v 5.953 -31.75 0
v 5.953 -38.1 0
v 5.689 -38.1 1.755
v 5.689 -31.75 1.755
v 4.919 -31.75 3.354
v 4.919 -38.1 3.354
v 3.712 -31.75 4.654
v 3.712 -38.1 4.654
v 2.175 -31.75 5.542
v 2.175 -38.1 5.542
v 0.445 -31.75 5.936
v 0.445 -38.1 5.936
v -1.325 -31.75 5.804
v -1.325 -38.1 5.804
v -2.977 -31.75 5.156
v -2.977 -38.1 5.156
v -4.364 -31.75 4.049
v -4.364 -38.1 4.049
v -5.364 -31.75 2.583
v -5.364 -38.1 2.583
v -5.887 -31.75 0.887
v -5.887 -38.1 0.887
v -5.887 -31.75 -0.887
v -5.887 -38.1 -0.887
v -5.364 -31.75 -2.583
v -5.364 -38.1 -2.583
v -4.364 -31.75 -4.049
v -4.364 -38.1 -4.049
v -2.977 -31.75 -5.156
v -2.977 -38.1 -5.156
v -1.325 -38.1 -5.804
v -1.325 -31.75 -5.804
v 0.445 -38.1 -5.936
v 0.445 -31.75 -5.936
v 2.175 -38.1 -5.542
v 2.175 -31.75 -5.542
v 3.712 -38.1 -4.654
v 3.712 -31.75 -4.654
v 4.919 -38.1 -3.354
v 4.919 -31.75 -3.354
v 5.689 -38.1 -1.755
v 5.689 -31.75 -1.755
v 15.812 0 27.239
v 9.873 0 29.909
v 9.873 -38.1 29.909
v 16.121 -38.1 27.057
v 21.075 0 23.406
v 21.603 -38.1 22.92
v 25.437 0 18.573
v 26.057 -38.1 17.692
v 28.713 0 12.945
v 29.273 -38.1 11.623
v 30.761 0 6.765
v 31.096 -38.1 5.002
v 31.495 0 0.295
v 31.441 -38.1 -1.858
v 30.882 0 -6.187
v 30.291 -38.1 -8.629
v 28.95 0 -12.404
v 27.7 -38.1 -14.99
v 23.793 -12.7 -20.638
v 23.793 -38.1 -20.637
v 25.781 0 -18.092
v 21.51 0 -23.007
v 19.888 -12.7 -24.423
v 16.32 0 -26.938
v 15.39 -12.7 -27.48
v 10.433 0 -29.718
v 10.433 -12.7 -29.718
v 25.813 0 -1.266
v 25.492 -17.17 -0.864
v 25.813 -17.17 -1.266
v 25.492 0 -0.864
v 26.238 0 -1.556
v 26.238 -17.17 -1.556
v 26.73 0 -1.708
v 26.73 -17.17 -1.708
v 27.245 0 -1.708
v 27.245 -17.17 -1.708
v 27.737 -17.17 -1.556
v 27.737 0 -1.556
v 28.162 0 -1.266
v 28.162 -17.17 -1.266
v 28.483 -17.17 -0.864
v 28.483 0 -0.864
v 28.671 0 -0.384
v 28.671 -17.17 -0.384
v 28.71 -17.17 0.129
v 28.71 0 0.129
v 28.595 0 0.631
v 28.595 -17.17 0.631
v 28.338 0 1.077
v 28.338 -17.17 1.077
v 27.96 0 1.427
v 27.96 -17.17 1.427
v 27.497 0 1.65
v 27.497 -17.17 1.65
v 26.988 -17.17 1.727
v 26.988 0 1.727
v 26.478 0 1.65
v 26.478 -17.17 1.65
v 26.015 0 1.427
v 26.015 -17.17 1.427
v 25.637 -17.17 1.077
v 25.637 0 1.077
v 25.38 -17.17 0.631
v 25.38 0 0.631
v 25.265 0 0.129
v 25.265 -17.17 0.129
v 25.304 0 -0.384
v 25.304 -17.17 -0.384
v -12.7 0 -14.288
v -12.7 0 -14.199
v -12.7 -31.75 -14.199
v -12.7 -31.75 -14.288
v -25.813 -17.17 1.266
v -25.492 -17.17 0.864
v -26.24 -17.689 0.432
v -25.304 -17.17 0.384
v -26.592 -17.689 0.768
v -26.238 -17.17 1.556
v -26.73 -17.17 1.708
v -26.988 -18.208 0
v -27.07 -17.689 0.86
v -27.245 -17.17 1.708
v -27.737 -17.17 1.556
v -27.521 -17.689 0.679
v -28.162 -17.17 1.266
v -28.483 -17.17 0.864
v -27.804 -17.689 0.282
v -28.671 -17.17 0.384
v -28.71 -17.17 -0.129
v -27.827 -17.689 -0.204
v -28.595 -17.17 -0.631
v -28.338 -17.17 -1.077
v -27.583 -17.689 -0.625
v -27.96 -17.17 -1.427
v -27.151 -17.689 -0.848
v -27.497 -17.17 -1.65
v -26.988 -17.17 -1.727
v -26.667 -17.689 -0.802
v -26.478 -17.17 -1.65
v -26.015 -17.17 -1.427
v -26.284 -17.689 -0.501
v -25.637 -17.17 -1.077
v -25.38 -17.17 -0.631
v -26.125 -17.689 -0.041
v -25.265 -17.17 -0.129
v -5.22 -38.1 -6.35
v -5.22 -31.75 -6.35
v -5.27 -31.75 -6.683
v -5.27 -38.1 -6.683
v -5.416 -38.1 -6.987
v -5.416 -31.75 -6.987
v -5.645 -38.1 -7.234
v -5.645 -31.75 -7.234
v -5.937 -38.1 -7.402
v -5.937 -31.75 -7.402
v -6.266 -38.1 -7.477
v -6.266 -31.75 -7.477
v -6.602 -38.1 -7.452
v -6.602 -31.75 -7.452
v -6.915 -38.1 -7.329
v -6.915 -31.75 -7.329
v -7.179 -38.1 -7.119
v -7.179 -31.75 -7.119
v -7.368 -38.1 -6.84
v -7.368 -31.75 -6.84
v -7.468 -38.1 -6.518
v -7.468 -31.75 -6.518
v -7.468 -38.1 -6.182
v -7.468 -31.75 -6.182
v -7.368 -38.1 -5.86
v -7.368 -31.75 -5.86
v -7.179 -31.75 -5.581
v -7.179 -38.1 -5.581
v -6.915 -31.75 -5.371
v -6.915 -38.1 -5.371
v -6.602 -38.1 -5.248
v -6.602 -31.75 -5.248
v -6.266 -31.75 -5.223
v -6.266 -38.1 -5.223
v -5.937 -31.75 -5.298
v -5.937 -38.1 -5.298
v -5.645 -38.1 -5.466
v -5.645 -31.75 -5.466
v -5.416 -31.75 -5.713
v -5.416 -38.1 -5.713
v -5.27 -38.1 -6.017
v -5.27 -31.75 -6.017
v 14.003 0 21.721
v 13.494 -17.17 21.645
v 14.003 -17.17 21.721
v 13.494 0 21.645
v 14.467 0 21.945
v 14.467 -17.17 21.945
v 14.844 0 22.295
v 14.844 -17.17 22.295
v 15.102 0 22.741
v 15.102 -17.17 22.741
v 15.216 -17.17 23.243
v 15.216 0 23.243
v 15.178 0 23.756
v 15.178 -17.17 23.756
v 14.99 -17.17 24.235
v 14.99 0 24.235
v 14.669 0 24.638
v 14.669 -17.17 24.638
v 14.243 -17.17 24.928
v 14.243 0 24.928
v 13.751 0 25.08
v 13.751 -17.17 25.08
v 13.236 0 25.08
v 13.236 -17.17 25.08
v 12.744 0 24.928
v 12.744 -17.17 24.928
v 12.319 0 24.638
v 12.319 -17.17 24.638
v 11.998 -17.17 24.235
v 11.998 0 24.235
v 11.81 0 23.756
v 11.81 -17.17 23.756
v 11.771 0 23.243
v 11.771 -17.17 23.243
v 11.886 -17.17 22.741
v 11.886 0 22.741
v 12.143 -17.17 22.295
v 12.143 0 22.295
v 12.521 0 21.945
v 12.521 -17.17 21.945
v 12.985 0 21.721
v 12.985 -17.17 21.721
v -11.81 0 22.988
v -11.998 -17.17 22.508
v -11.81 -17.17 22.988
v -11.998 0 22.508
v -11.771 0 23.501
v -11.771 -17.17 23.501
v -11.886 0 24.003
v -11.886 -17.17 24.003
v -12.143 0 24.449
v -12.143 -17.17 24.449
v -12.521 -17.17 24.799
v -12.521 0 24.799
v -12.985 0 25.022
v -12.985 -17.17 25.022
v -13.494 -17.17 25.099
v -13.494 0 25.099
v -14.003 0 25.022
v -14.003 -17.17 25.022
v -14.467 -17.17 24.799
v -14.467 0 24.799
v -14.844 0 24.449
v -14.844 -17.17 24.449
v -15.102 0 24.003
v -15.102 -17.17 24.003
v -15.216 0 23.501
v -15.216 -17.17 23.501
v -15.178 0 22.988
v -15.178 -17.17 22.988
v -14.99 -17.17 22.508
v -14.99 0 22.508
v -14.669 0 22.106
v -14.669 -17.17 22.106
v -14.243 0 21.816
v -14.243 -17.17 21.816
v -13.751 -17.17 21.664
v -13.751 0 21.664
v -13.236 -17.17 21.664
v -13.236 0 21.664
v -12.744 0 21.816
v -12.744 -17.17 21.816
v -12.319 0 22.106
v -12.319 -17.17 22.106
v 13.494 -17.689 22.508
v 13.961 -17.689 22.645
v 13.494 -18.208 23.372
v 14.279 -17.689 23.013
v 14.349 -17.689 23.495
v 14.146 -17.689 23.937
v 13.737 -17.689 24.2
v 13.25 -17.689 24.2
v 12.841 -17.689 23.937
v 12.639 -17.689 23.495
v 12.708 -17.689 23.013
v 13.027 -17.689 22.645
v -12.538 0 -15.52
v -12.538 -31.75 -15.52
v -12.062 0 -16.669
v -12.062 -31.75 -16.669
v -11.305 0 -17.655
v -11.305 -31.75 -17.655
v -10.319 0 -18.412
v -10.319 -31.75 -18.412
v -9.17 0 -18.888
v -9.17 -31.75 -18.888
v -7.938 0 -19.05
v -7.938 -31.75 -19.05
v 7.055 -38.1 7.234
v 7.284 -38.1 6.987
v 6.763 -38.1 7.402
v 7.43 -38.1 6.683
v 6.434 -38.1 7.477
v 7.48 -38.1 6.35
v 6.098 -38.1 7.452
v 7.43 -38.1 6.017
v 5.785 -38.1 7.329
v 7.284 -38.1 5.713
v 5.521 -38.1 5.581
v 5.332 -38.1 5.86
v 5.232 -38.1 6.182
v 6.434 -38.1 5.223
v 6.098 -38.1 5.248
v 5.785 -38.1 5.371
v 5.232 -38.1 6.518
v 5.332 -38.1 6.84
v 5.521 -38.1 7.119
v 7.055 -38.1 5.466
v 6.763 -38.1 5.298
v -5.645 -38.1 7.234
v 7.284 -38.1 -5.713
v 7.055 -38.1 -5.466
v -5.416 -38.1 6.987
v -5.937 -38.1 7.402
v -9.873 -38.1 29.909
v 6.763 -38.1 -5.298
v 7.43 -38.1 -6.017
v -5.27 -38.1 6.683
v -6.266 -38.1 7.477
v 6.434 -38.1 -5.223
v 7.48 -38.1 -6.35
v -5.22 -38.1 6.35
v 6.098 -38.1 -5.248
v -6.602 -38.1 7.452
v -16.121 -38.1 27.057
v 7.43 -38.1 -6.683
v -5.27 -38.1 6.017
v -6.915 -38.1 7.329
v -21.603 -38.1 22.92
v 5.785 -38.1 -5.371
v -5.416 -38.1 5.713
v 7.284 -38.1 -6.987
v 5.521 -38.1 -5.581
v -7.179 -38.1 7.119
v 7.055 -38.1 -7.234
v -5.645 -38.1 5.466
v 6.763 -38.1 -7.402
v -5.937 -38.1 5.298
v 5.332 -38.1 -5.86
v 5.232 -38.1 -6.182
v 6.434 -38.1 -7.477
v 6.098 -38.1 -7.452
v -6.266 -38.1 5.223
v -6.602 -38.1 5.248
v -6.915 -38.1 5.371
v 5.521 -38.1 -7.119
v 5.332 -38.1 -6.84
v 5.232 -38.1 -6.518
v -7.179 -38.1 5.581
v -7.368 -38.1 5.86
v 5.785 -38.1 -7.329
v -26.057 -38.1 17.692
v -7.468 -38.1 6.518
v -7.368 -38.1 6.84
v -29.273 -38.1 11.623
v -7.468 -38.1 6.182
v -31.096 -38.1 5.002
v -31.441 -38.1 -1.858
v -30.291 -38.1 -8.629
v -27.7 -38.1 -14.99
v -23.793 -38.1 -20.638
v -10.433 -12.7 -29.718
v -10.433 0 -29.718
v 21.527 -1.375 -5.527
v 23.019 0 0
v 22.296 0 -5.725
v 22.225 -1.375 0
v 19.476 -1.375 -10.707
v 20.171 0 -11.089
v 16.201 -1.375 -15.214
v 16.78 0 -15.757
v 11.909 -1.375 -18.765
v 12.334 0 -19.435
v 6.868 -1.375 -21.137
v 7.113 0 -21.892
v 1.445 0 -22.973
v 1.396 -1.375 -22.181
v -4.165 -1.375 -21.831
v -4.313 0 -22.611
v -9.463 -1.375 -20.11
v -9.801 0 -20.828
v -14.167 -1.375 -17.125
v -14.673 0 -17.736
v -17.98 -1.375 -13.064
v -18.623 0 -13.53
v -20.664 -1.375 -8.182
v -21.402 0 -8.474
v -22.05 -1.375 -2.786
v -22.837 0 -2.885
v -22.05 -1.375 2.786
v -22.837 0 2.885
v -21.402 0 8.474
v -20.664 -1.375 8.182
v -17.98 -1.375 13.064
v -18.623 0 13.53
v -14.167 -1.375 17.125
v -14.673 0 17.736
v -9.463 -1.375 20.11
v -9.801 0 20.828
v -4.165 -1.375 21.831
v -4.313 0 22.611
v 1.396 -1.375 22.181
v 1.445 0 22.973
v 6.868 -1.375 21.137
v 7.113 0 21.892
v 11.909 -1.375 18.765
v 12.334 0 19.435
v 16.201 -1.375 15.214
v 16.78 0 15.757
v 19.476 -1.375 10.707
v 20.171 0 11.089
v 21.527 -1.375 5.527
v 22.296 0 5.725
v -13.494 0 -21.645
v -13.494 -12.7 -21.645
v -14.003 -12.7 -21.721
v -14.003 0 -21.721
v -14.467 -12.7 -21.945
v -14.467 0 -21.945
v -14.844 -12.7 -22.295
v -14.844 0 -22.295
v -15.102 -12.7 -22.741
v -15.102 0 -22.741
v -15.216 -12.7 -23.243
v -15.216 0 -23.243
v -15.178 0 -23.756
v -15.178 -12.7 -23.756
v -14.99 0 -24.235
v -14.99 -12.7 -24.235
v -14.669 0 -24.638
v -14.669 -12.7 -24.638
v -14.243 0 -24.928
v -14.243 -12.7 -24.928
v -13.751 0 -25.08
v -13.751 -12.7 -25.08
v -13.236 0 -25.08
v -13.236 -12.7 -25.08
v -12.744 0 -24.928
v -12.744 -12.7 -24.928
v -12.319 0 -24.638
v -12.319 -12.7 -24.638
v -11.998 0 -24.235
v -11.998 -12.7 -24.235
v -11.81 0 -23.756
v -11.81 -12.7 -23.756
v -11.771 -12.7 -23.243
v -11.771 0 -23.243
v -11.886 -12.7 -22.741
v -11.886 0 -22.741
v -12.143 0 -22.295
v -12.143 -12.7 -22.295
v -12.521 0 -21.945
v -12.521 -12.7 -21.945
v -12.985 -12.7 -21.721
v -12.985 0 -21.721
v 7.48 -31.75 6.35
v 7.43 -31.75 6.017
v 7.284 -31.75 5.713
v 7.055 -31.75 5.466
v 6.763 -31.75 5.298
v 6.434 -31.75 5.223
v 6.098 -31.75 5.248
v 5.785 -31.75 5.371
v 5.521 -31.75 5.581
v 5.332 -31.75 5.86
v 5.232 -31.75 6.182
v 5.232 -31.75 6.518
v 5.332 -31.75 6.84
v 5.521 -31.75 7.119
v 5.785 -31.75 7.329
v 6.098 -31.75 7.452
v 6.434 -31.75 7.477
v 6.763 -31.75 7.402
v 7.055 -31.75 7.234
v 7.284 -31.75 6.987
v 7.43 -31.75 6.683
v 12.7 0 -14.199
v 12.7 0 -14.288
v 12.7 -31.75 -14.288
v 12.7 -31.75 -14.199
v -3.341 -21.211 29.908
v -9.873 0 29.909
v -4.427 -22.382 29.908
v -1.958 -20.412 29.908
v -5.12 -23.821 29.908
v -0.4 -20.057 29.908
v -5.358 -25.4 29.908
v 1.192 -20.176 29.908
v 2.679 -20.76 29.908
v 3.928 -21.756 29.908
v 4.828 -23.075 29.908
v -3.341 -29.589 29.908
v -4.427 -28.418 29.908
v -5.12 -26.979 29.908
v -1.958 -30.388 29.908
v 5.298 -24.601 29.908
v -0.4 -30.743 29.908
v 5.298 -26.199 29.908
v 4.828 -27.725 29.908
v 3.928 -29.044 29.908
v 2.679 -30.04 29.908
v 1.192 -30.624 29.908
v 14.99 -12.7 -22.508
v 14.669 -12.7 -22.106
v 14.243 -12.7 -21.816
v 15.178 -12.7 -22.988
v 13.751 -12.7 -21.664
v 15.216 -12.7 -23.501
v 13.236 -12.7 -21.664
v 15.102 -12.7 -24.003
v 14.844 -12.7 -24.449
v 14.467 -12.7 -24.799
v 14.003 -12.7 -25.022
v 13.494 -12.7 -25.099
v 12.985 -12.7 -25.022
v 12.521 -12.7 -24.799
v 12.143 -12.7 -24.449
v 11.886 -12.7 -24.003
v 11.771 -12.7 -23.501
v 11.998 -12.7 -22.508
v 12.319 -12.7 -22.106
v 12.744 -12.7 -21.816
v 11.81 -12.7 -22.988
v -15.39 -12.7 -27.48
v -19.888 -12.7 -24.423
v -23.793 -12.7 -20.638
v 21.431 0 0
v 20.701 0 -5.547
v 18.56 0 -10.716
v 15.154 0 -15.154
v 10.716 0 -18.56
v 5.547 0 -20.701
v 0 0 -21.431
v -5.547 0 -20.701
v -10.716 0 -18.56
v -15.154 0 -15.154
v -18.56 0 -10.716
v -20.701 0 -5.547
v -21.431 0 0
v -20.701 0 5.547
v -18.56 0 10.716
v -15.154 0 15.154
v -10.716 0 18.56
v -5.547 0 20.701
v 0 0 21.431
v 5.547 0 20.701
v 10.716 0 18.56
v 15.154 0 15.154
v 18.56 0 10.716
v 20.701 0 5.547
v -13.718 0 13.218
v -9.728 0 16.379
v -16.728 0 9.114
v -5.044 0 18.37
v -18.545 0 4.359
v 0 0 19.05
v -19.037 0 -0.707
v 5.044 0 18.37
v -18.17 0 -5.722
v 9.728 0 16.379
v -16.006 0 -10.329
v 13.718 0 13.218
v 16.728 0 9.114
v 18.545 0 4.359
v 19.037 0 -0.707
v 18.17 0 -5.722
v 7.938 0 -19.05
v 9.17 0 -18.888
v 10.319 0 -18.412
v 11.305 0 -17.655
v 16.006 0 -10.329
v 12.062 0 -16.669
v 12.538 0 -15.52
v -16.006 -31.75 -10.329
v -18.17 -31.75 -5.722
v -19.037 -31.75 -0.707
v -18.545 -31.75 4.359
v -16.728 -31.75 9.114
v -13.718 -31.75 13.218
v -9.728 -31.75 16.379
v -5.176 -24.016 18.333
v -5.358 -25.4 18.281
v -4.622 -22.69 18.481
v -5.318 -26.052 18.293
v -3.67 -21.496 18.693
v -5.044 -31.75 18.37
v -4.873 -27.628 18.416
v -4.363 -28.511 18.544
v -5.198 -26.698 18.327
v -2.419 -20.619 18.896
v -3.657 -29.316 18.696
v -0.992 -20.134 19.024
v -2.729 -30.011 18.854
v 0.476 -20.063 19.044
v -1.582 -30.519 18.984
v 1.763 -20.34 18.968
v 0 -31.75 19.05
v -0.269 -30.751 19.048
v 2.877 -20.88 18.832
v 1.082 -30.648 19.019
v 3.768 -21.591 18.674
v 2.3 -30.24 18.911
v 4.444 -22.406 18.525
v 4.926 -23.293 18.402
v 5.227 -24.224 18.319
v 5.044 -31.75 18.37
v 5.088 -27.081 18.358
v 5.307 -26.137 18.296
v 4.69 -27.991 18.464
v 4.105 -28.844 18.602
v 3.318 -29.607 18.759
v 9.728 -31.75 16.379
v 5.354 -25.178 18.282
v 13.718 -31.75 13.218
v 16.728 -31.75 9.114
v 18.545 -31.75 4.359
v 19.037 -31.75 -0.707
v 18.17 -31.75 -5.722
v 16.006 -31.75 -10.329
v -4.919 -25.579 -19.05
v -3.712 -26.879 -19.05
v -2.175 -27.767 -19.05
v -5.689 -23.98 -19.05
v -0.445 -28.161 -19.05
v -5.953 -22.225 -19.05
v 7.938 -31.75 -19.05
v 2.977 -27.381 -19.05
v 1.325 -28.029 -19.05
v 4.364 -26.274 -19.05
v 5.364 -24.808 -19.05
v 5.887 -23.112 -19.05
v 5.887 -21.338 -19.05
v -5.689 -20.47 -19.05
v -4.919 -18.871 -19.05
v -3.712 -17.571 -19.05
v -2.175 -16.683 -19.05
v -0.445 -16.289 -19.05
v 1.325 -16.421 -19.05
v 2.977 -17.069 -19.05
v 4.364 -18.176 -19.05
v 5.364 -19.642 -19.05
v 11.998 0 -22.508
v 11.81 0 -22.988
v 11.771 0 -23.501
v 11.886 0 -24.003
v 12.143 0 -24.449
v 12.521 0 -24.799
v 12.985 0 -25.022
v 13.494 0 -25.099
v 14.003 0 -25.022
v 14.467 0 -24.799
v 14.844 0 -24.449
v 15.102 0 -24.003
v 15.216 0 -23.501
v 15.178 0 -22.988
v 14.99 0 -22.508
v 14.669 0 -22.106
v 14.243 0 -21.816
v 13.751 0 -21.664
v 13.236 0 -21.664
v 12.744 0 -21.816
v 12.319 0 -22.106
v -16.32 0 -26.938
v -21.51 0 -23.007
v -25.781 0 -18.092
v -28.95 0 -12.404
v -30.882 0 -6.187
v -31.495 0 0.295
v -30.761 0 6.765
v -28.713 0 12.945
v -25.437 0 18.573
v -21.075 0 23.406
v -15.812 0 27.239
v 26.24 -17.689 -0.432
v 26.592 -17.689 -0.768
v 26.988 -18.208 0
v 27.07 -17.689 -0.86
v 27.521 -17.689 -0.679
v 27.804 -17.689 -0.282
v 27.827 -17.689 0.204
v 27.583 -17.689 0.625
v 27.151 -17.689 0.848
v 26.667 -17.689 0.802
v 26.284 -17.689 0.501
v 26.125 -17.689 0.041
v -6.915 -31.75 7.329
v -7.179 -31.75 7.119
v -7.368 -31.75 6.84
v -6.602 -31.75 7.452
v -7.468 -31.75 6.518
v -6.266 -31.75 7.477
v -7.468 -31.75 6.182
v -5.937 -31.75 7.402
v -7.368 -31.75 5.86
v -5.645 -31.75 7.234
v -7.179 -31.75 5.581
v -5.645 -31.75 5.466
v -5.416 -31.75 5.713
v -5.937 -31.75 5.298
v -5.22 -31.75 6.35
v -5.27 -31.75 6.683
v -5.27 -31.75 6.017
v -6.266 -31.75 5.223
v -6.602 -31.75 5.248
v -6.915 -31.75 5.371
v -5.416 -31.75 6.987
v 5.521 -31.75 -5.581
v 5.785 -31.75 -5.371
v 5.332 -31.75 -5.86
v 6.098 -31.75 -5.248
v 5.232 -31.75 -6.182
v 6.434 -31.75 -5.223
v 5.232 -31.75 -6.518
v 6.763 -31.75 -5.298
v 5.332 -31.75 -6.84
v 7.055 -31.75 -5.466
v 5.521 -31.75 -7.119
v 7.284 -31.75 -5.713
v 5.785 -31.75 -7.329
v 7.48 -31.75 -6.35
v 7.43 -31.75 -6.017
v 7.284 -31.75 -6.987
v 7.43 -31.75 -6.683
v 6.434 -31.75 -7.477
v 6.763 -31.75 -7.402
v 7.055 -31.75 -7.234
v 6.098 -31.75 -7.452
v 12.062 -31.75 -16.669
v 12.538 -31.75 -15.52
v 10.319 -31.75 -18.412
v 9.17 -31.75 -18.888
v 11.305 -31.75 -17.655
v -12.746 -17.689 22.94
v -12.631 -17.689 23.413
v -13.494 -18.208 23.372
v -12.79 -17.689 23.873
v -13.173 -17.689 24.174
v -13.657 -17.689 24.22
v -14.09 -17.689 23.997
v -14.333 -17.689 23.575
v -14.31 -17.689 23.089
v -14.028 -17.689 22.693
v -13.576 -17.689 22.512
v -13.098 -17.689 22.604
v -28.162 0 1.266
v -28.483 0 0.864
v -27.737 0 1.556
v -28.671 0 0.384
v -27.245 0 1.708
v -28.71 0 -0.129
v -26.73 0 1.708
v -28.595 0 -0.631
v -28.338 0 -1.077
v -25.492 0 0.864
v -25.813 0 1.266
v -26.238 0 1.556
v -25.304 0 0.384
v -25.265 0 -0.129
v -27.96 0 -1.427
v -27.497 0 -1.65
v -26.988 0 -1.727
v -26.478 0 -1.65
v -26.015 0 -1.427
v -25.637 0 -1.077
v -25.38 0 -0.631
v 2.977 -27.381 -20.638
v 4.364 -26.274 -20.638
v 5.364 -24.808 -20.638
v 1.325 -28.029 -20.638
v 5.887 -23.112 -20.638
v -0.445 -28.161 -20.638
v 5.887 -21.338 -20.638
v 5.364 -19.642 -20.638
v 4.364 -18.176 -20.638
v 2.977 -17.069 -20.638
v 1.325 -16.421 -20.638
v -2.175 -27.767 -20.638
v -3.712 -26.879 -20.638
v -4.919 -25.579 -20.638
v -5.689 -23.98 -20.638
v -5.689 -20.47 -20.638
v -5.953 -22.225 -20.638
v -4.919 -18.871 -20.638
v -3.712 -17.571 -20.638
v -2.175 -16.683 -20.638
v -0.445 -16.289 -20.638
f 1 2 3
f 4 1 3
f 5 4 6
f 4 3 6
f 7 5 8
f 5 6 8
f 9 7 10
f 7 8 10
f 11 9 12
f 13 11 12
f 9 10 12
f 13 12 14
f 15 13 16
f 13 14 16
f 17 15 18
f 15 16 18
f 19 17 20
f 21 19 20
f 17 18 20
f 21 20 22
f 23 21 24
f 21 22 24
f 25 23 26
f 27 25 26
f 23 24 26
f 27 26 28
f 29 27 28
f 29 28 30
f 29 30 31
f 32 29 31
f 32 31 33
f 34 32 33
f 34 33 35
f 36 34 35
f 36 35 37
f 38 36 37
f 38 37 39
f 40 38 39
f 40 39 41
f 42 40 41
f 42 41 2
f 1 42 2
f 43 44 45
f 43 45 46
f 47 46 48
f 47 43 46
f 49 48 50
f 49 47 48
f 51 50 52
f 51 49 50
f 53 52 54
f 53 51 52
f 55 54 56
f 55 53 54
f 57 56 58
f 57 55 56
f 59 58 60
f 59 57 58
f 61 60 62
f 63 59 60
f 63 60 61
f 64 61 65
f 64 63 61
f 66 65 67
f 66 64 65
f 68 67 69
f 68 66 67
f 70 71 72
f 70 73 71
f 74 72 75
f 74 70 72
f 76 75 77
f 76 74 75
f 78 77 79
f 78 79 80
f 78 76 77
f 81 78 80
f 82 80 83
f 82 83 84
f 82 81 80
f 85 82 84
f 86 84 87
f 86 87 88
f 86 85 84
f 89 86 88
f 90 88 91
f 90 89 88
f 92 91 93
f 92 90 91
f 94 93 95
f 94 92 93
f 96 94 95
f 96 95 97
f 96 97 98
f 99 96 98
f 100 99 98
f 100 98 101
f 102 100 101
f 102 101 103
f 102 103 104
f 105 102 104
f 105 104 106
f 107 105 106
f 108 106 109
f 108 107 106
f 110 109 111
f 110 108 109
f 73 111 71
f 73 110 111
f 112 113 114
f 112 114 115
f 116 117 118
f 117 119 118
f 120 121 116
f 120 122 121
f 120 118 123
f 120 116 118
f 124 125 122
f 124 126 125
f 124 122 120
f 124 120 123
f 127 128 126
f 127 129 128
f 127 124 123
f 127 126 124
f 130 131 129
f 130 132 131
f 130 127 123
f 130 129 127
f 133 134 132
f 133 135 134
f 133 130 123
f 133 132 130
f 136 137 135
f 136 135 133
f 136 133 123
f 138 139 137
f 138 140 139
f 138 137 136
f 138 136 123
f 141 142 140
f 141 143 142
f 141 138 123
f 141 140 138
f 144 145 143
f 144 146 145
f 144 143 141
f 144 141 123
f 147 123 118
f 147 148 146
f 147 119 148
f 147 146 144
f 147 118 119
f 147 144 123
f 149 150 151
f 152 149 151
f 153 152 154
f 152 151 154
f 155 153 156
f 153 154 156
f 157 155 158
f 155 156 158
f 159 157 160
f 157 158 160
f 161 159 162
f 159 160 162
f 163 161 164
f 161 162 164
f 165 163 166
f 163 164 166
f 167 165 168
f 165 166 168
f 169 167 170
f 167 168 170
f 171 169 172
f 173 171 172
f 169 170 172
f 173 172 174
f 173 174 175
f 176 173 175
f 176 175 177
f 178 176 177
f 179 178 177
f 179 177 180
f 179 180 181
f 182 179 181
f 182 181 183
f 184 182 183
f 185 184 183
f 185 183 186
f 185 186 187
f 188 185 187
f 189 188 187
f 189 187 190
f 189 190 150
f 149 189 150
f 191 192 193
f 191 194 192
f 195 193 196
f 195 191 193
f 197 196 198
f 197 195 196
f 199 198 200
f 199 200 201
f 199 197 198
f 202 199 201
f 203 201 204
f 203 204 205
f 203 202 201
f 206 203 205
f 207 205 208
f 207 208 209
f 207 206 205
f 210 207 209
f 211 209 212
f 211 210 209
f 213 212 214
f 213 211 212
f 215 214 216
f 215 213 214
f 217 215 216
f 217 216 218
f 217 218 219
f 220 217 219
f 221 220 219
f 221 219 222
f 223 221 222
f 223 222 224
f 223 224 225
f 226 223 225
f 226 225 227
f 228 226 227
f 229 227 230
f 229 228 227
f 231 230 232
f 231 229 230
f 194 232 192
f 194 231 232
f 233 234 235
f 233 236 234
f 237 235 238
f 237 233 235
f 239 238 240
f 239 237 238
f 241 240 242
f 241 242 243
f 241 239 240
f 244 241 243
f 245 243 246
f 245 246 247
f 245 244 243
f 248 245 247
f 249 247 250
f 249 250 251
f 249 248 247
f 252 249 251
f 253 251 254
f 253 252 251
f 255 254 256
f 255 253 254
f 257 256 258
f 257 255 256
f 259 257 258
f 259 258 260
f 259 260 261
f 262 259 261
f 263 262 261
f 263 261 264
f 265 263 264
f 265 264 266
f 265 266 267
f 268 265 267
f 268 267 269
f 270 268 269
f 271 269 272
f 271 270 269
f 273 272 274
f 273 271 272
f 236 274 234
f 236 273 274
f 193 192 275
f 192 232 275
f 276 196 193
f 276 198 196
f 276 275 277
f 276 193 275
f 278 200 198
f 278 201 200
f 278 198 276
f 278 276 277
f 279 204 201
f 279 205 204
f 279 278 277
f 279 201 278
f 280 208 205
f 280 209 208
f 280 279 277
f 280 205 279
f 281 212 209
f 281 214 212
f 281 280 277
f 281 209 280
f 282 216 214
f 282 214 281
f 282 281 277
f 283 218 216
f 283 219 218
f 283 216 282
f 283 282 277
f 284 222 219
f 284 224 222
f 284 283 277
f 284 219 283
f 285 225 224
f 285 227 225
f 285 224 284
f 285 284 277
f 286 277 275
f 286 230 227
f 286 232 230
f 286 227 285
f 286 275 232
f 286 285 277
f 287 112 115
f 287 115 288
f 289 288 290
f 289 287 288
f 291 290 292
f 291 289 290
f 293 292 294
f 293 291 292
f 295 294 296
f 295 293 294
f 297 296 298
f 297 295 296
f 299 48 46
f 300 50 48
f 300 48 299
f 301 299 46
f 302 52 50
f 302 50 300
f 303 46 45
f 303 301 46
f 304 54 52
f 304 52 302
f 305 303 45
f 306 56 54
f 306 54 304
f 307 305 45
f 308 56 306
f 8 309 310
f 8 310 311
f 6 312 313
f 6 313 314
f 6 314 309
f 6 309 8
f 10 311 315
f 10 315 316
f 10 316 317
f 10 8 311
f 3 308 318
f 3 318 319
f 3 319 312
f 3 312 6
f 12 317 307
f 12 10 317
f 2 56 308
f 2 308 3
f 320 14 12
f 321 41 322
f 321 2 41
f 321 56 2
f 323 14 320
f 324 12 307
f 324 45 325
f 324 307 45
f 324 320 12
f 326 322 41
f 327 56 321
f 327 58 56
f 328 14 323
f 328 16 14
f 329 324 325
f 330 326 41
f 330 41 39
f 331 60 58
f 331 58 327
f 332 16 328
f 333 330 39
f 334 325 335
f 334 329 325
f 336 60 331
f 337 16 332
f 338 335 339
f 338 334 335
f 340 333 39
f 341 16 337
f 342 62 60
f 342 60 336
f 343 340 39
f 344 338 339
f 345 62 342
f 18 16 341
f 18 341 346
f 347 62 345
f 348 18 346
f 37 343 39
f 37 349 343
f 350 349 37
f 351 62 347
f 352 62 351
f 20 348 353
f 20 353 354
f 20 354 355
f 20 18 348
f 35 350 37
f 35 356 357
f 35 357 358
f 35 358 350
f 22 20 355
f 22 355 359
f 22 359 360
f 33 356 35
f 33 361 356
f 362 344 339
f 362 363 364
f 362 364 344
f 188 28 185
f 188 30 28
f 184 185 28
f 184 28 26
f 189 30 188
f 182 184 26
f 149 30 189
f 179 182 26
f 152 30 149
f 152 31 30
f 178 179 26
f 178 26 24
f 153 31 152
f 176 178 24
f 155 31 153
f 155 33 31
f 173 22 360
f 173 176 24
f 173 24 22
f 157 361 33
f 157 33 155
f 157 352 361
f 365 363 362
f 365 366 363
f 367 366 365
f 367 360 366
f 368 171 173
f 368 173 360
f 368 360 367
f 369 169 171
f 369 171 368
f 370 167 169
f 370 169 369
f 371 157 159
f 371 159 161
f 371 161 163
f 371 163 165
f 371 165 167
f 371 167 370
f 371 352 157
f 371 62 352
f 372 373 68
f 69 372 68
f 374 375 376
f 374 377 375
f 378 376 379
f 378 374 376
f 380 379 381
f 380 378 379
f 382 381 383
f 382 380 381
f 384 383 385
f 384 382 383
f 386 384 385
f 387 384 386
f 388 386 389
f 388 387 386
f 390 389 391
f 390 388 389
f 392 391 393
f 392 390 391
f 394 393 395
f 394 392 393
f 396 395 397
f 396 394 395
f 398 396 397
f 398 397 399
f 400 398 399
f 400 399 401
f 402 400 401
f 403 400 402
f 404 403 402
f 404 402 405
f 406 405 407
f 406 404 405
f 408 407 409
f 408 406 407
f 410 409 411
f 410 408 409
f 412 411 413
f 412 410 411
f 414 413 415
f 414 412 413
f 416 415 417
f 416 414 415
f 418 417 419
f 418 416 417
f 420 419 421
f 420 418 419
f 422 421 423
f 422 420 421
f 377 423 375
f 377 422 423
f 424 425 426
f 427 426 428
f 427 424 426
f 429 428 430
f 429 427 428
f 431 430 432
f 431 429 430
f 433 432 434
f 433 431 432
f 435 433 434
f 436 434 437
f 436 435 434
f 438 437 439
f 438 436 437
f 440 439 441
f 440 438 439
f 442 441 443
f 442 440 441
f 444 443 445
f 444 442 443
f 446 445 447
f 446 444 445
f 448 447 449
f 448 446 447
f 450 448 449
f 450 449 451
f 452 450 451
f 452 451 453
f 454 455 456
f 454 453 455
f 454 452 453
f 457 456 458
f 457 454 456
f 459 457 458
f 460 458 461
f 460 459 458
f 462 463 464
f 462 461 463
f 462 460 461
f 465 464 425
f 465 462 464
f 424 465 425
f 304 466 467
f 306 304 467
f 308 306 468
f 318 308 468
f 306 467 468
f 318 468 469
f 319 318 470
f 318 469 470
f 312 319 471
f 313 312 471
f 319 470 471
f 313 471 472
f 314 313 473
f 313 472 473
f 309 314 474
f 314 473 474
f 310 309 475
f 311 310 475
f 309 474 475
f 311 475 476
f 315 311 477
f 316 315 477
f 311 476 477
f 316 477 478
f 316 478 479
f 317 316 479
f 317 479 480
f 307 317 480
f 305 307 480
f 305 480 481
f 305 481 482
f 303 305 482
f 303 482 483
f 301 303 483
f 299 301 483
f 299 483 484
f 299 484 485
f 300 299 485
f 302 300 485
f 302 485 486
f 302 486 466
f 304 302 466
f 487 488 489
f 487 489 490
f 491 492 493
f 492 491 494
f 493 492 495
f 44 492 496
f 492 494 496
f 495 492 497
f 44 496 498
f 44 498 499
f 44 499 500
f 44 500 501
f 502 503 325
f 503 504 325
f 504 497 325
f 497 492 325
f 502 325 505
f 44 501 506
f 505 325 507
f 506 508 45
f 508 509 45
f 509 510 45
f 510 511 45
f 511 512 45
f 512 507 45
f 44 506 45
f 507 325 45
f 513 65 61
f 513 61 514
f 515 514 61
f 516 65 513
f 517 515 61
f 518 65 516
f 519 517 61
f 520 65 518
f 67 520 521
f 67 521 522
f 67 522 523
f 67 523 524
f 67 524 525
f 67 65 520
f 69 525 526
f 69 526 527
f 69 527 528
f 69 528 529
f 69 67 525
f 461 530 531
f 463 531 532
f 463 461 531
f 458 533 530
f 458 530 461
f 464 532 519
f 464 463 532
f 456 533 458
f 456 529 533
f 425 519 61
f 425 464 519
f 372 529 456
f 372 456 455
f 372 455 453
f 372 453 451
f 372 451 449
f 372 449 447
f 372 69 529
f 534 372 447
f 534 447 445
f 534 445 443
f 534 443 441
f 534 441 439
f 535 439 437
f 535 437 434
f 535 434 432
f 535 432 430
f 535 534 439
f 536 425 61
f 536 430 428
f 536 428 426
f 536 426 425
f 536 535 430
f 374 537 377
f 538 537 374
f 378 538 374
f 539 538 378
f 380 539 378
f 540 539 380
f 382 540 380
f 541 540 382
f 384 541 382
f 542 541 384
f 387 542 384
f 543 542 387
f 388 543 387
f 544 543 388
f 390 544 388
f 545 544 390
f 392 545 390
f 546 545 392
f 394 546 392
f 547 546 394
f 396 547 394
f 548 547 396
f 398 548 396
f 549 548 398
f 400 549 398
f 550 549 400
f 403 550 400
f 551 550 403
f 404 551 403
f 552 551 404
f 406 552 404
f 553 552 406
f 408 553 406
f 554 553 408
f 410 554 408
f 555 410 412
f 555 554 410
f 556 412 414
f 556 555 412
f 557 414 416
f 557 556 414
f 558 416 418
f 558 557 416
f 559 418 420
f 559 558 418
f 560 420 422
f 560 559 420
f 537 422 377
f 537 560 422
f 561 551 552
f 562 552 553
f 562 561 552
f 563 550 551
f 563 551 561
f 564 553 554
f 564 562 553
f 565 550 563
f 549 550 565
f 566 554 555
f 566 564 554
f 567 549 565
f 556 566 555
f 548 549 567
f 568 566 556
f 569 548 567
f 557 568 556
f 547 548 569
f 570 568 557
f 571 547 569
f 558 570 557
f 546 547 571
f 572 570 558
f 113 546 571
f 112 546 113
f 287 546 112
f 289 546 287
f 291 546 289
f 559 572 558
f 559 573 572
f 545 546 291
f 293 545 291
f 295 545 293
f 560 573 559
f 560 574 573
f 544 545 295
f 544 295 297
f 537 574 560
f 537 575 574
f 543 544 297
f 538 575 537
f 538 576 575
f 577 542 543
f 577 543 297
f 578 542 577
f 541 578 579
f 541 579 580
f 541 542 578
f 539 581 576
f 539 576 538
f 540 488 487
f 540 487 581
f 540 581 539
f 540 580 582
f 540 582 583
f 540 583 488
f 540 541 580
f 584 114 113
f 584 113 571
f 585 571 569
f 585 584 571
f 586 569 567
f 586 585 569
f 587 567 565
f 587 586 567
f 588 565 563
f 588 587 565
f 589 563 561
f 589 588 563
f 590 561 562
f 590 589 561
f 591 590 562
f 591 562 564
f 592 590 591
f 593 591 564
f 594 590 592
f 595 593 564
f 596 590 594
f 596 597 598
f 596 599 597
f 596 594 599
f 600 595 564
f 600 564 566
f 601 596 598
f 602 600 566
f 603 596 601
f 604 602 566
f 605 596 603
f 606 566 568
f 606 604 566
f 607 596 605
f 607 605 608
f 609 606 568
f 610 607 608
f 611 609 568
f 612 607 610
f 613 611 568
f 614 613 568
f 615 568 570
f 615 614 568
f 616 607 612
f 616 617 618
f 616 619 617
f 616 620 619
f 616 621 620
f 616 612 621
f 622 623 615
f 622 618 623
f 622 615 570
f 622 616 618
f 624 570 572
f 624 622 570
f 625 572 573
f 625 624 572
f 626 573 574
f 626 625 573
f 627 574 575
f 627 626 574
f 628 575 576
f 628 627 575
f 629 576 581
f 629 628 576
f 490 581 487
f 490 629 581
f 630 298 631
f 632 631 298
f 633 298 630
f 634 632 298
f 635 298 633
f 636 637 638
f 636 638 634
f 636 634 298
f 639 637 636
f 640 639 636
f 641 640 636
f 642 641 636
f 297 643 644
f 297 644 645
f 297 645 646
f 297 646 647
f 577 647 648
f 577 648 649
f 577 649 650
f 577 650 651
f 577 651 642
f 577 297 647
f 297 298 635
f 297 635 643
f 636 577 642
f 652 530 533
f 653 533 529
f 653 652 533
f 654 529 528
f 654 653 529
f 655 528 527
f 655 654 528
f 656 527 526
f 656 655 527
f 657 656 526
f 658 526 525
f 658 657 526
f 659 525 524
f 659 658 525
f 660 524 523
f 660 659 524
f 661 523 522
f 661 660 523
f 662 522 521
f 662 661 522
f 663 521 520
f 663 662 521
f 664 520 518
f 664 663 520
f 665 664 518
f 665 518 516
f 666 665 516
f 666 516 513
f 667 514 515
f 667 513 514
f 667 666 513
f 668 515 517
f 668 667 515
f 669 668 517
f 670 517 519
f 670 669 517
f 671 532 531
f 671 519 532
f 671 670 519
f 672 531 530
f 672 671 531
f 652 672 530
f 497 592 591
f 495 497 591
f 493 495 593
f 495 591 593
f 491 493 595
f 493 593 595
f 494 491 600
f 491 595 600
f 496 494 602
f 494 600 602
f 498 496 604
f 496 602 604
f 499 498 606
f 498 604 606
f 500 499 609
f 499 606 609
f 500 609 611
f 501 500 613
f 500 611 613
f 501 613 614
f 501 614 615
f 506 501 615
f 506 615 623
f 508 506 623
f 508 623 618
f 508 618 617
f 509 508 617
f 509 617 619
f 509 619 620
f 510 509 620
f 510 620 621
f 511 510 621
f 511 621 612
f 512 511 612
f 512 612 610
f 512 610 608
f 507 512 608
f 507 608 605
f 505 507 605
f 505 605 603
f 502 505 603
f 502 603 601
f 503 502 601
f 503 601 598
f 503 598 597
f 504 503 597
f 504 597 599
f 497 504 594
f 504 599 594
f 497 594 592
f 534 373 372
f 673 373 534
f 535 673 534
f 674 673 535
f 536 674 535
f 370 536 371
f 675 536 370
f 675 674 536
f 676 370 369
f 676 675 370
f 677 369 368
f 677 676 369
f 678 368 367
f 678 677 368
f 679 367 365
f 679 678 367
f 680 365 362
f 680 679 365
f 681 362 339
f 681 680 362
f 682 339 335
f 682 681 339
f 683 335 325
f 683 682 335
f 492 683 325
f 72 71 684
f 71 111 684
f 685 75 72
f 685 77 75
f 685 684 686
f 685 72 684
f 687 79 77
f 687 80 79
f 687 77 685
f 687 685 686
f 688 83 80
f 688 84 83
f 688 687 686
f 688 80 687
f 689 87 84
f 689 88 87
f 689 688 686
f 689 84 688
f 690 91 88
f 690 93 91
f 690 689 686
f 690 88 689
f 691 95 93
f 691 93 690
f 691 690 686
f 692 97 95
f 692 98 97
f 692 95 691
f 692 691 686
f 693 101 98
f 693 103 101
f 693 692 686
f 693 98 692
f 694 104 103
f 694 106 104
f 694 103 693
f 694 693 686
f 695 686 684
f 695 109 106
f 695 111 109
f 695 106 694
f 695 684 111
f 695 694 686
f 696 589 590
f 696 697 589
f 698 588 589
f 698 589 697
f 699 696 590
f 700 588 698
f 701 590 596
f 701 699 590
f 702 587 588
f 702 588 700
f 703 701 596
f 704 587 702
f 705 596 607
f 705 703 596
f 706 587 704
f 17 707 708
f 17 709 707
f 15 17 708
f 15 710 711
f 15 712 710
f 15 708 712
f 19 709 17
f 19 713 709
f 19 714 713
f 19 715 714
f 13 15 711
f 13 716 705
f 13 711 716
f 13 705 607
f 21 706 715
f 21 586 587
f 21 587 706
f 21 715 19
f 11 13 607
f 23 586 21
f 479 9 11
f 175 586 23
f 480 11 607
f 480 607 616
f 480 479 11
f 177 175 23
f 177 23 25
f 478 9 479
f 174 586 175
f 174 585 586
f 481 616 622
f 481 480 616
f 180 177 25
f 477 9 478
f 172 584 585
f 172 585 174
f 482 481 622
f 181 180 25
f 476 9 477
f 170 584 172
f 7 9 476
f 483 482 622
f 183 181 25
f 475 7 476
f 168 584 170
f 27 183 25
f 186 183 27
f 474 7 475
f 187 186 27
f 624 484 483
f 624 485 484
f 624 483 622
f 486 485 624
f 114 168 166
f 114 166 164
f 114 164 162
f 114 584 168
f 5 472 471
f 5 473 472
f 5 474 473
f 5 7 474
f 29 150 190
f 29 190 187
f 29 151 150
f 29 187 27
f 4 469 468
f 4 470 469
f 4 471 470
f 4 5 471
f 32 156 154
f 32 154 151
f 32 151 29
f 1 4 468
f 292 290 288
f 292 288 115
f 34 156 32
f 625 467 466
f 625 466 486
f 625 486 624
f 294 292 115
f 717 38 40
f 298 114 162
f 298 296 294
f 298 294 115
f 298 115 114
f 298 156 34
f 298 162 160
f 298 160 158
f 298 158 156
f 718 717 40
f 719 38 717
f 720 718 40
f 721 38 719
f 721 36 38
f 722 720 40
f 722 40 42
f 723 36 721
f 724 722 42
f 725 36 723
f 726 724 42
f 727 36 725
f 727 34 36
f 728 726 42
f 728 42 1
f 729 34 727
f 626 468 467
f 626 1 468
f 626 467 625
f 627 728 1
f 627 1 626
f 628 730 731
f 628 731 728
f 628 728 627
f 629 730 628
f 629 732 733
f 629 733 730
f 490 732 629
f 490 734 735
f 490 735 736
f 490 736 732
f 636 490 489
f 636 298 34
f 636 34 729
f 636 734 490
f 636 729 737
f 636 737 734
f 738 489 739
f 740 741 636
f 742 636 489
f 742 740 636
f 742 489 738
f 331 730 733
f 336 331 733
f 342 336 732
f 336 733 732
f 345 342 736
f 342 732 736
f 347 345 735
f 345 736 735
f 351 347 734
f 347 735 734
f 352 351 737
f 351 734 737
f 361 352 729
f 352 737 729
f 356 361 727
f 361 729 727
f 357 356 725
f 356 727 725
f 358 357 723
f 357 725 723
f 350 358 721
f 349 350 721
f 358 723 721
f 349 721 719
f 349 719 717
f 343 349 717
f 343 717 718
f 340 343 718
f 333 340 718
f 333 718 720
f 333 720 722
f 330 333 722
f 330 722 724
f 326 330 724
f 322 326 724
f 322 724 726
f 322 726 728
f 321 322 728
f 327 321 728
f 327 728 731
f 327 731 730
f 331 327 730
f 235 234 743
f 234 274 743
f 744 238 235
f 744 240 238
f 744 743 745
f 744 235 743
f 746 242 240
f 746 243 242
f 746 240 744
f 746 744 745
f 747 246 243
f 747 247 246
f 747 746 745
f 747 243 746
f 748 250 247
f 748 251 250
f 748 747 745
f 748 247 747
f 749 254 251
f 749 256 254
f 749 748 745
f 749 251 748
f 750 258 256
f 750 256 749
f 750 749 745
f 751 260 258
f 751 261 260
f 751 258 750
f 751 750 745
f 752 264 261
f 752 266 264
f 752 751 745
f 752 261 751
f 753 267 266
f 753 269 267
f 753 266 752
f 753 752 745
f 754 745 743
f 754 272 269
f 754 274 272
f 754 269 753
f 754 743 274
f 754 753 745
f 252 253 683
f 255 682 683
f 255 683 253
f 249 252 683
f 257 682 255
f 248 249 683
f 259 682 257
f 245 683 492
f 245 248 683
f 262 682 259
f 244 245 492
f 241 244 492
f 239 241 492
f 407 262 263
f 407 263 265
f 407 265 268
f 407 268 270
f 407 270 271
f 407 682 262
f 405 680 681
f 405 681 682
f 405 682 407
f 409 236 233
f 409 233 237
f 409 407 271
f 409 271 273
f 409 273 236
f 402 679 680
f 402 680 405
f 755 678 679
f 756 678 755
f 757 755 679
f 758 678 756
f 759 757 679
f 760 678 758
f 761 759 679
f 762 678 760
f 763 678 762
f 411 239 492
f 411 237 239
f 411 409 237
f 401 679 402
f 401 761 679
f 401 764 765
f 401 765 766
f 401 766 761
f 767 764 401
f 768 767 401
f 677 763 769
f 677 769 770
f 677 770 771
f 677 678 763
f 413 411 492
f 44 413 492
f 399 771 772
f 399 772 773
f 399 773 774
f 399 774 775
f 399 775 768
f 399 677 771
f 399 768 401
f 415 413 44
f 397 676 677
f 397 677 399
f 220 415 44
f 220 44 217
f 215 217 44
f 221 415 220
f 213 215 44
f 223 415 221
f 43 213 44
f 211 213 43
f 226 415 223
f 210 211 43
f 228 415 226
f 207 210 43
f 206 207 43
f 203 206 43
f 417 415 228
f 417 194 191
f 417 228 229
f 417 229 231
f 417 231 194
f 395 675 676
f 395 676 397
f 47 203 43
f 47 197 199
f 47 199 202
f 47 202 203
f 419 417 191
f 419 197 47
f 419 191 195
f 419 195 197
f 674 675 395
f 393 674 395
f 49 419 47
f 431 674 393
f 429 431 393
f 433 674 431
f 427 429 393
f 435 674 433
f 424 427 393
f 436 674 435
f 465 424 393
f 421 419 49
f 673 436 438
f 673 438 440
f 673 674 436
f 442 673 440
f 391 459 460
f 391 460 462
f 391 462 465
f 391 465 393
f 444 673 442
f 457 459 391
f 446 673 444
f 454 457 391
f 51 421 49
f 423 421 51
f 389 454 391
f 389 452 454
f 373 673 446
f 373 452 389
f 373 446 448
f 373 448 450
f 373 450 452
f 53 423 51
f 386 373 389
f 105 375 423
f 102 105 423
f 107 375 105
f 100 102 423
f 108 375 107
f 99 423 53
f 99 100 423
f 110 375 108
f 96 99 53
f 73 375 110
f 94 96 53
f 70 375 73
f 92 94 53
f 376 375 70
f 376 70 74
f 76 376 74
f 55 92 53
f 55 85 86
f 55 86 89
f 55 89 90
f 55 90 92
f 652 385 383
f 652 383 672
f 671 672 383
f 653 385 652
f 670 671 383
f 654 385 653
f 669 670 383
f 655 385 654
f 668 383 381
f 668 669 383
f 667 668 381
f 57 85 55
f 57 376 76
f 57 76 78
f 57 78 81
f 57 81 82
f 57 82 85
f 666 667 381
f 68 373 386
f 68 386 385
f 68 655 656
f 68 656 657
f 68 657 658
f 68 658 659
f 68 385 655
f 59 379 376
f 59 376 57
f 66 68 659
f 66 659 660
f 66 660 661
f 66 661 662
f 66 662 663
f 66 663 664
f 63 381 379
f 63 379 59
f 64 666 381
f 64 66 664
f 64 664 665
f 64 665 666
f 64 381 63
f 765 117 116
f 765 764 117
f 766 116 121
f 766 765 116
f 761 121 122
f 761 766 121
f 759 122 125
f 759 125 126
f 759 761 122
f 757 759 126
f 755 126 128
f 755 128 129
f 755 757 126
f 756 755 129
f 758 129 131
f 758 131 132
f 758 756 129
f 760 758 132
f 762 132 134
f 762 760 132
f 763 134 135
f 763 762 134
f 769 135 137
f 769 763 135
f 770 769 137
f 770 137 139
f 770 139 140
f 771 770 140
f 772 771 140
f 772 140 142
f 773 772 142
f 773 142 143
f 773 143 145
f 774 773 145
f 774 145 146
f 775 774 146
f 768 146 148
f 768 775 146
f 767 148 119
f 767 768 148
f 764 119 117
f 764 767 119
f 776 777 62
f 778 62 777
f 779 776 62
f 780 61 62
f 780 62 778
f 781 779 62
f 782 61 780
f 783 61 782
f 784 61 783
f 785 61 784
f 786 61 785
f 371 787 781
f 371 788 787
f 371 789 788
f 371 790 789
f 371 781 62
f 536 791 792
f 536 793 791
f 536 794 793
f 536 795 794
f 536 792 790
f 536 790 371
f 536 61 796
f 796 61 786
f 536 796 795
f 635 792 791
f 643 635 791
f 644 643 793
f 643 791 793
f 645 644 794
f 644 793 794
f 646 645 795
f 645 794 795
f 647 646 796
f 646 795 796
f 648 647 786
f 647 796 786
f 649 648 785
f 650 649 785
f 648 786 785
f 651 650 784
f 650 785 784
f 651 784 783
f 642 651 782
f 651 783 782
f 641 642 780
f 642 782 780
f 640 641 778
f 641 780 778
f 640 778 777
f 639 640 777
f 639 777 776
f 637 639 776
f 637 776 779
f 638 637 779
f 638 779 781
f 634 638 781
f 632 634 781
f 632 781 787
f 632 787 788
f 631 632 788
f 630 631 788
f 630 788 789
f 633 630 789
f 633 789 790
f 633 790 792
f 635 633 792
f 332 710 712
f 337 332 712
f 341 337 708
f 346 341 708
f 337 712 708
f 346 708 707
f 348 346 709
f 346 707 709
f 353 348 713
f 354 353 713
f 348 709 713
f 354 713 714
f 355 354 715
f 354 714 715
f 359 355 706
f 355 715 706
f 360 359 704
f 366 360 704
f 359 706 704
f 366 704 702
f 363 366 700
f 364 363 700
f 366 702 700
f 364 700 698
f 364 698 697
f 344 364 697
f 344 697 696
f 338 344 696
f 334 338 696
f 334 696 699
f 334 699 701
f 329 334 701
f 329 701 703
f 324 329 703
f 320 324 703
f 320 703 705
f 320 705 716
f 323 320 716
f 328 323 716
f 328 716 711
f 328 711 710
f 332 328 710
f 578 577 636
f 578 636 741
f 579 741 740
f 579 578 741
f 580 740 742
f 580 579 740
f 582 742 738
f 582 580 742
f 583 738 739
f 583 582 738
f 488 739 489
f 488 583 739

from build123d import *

# Parameters (mm, degrees)
CUT_EXTRUDE1_DEPTH          = 59.614042959
CIRPATTERN1_COUNT           = 6
SKETCH11_R                  = 5.953125
CUT_EXTRUDE3_DEPTH          = 59.614042959
F_4_40_TAPPED_HOLE2_D       = 2.2606
CUT_EXTRUDE4_DEPTH          = 59.614042959
F_1_2_13_TAPPED_HOLE1_D     = 10.71626
F_1_2_13_TAPPED_HOLE1_DEPTH = 28.829
F_1_2_13_TAPPED_HOLE1_TIP   = 3.219489309
CUT_EXTRUDE5_REACH          = 79.453
CUT_EXTRUDE5_END_RADIUS     = 19.05
SKETCH23_R                  = 5.953125
CUT_EXTRUDE6_REACH          = 59.777
SKETCH25_W                  = 87.993587341
SKETCH25_H                  = 27.156858223
CUT_EXTRUDE7_DEPTH          = 9.0805


with BuildPart() as part:
    # Sketch1 → Revolve1 (revolve)
    with BuildSketch(Plane.XY):
        Polygon((19.05, 0), (19.05, -31.75), (0, -31.75), (0, -38.1), (31.496, -38.1), (31.496, 0), (23.01875, 0), (22.225, -1.374815329), (21.43125, 0), align=None)
    revolve(axis=Axis((0, -582.039095303, 0), (0, 1, 0)))

    # Sketch2 → Cut-Extrude1 (cut, through all)
    with BuildSketch(Plane(origin=(0, 0, 0), x_dir=(1, 0, 0), z_dir=(0, 1, 0))):
        with BuildLine():
            Line((-10.432568811, 29.718), (10.432568811, 29.718))
            ThreePointArc((10.432568811, 29.718), (0, 31.496), (-10.432568811, 29.718))
        make_face()
    extrude(amount=-CUT_EXTRUDE1_DEPTH, mode=Mode.SUBTRACT)

    # Sketch5 → #8-32 Tapped Hole1 (revolve, cut)
    with BuildSketch(Plane(origin=(-13.49375, 0, -23.371860585), x_dir=(0, 0, 1), z_dir=(1, 0, 0))):
        Polygon((0, 0), (0, 18.208206461), (1.7272, 17.1704), (1.7272, 0), align=None)
    f_8_32_tapped_hole1 = revolve(axis=Axis((-13.49375, 6.35, -23.371860585), (0, -1, 0)), mode=Mode.SUBTRACT)

    # CirPattern1: #8-32 Tapped Hole1 ×6 about axis
    cirpattern1_axis = Axis((0, 0, 0), (0, 1, 0))
    for i in range(1, CIRPATTERN1_COUNT):
        add(f_8_32_tapped_hole1.rotate(cirpattern1_axis, i * 360 / CIRPATTERN1_COUNT), mode=Mode.SUBTRACT)

    # Sketch11 → Cut-Extrude3 (cut, through all)
    with BuildSketch(Plane.XZ.offset(38.1)):
        Circle(SKETCH11_R)
    extrude(amount=-CUT_EXTRUDE3_DEPTH, mode=Mode.SUBTRACT)

    # #4-40 Tapped Hole2 (through all)
    with Locations(Plane(origin=(0, -38.1, 0), x_dir=(-1, 0, 0), z_dir=(0, -1, 0))):
        with Locations((6.35, -6.35), (-6.35, -6.35), (-6.35, 6.35), (6.35, 6.35)):
            Hole(F_4_40_TAPPED_HOLE2_D / 2)

    # Sketch16 → Cut-Extrude4 (cut, through all)
    with BuildSketch(Plane.XZ.offset(38.1)):
        with BuildLine():
            Line((-9.873177996, 29.9085), (9.873177996, 29.9085))
            ThreePointArc((9.873177996, 29.9085), (0, 31.496), (-9.873177996, 29.9085))
        make_face()
    extrude(amount=-CUT_EXTRUDE4_DEPTH, mode=Mode.SUBTRACT)

    # 1/2-13 Tapped Hole1
    with Locations(Plane.XY.offset(29.9085)):
        with Locations((0, -25.4)):
            Hole(F_1_2_13_TAPPED_HOLE1_D / 2, depth=F_1_2_13_TAPPED_HOLE1_DEPTH)
            with Locations((0, 0, -(F_1_2_13_TAPPED_HOLE1_DEPTH + F_1_2_13_TAPPED_HOLE1_TIP / 2))):  # 118° drill point
                Cone(0, F_1_2_13_TAPPED_HOLE1_D / 2, F_1_2_13_TAPPED_HOLE1_TIP, mode=Mode.SUBTRACT)

    # Cut-Extrude5: up to this cylinder (the profile starts outside it)
    cut_extrude5_end = Plane(origin=(0, -22.225, 0), z_dir=(0, -1, 0)) * Cylinder(CUT_EXTRUDE5_END_RADIUS, 198.006, mode=Mode.PRIVATE)
    # Sketch23 → Cut-Extrude5 (cut, up to the surface)
    with BuildSketch(Plane(origin=(0, 0, -29.718), x_dir=(-1, 0, 0), z_dir=(0, 0, -1)), mode=Mode.PRIVATE) as cut_extrude5_sk1:
        with Locations((0, -22.225)):
            Circle(SKETCH23_R)
    cut_extrude5_tool1 = extrude(cut_extrude5_sk1.sketch, amount=-CUT_EXTRUDE5_REACH, mode=Mode.PRIVATE) - cut_extrude5_end
    add(cut_extrude5_tool1.solids().sort_by_distance((0, -22.225, -29.718))[0], mode=Mode.SUBTRACT)

    # Cut-Extrude6: up to this face of the body (flat: up to its plane)
    cut_extrude6_end = Plane(part.part.faces().sort_by_distance((-18.511184633, -31.75, 0))[0])
    # Sketch24 → Cut-Extrude6 (cut, up to the picked face)
    with BuildSketch(Plane(origin=(0, 0, 0), x_dir=(1, 0, 0), z_dir=(0, 1, 0)), mode=Mode.PRIVATE) as cut_extrude6_sk1:
        with BuildLine():
            Line((-7.9375, 19.05), (7.9375, 19.05))
            ThreePointArc((7.9375, 19.05), (11.305096045, 17.655096045), (12.7, 14.2875))
            Line((12.7, 14.2875), (12.7, 5.742929028))
            Line((12.7, 5.742929028), (-12.7, 5.742929028))
            Line((-12.7, 5.742929028), (-12.7, 14.2875))
            ThreePointArc((-12.7, 14.2875), (-11.305096045, 17.655096045), (-7.9375, 19.05))
        make_face()
    cut_extrude6_tool1 = split(extrude(cut_extrude6_sk1.sketch, amount=-CUT_EXTRUDE6_REACH, mode=Mode.PRIVATE), bisect_by=cut_extrude6_end, keep=Keep.BOTH, mode=Mode.PRIVATE)
    add(cut_extrude6_tool1.solids().sort_by(Axis((0, 0, -12.230696), (0, -1, 0)))[0], mode=Mode.SUBTRACT)

    # Sketch25 → Cut-Extrude7 (cut)
    with BuildSketch(Plane(origin=(0, 0, -29.718), x_dir=(-1, 0, 0), z_dir=(0, 0, -1))):
        with Locations((-3.719611081, -26.278429112)):
            Rectangle(SKETCH25_W, SKETCH25_H)
    extrude(amount=-CUT_EXTRUDE7_DEPTH, mode=Mode.SUBTRACT)


solid = part.part
